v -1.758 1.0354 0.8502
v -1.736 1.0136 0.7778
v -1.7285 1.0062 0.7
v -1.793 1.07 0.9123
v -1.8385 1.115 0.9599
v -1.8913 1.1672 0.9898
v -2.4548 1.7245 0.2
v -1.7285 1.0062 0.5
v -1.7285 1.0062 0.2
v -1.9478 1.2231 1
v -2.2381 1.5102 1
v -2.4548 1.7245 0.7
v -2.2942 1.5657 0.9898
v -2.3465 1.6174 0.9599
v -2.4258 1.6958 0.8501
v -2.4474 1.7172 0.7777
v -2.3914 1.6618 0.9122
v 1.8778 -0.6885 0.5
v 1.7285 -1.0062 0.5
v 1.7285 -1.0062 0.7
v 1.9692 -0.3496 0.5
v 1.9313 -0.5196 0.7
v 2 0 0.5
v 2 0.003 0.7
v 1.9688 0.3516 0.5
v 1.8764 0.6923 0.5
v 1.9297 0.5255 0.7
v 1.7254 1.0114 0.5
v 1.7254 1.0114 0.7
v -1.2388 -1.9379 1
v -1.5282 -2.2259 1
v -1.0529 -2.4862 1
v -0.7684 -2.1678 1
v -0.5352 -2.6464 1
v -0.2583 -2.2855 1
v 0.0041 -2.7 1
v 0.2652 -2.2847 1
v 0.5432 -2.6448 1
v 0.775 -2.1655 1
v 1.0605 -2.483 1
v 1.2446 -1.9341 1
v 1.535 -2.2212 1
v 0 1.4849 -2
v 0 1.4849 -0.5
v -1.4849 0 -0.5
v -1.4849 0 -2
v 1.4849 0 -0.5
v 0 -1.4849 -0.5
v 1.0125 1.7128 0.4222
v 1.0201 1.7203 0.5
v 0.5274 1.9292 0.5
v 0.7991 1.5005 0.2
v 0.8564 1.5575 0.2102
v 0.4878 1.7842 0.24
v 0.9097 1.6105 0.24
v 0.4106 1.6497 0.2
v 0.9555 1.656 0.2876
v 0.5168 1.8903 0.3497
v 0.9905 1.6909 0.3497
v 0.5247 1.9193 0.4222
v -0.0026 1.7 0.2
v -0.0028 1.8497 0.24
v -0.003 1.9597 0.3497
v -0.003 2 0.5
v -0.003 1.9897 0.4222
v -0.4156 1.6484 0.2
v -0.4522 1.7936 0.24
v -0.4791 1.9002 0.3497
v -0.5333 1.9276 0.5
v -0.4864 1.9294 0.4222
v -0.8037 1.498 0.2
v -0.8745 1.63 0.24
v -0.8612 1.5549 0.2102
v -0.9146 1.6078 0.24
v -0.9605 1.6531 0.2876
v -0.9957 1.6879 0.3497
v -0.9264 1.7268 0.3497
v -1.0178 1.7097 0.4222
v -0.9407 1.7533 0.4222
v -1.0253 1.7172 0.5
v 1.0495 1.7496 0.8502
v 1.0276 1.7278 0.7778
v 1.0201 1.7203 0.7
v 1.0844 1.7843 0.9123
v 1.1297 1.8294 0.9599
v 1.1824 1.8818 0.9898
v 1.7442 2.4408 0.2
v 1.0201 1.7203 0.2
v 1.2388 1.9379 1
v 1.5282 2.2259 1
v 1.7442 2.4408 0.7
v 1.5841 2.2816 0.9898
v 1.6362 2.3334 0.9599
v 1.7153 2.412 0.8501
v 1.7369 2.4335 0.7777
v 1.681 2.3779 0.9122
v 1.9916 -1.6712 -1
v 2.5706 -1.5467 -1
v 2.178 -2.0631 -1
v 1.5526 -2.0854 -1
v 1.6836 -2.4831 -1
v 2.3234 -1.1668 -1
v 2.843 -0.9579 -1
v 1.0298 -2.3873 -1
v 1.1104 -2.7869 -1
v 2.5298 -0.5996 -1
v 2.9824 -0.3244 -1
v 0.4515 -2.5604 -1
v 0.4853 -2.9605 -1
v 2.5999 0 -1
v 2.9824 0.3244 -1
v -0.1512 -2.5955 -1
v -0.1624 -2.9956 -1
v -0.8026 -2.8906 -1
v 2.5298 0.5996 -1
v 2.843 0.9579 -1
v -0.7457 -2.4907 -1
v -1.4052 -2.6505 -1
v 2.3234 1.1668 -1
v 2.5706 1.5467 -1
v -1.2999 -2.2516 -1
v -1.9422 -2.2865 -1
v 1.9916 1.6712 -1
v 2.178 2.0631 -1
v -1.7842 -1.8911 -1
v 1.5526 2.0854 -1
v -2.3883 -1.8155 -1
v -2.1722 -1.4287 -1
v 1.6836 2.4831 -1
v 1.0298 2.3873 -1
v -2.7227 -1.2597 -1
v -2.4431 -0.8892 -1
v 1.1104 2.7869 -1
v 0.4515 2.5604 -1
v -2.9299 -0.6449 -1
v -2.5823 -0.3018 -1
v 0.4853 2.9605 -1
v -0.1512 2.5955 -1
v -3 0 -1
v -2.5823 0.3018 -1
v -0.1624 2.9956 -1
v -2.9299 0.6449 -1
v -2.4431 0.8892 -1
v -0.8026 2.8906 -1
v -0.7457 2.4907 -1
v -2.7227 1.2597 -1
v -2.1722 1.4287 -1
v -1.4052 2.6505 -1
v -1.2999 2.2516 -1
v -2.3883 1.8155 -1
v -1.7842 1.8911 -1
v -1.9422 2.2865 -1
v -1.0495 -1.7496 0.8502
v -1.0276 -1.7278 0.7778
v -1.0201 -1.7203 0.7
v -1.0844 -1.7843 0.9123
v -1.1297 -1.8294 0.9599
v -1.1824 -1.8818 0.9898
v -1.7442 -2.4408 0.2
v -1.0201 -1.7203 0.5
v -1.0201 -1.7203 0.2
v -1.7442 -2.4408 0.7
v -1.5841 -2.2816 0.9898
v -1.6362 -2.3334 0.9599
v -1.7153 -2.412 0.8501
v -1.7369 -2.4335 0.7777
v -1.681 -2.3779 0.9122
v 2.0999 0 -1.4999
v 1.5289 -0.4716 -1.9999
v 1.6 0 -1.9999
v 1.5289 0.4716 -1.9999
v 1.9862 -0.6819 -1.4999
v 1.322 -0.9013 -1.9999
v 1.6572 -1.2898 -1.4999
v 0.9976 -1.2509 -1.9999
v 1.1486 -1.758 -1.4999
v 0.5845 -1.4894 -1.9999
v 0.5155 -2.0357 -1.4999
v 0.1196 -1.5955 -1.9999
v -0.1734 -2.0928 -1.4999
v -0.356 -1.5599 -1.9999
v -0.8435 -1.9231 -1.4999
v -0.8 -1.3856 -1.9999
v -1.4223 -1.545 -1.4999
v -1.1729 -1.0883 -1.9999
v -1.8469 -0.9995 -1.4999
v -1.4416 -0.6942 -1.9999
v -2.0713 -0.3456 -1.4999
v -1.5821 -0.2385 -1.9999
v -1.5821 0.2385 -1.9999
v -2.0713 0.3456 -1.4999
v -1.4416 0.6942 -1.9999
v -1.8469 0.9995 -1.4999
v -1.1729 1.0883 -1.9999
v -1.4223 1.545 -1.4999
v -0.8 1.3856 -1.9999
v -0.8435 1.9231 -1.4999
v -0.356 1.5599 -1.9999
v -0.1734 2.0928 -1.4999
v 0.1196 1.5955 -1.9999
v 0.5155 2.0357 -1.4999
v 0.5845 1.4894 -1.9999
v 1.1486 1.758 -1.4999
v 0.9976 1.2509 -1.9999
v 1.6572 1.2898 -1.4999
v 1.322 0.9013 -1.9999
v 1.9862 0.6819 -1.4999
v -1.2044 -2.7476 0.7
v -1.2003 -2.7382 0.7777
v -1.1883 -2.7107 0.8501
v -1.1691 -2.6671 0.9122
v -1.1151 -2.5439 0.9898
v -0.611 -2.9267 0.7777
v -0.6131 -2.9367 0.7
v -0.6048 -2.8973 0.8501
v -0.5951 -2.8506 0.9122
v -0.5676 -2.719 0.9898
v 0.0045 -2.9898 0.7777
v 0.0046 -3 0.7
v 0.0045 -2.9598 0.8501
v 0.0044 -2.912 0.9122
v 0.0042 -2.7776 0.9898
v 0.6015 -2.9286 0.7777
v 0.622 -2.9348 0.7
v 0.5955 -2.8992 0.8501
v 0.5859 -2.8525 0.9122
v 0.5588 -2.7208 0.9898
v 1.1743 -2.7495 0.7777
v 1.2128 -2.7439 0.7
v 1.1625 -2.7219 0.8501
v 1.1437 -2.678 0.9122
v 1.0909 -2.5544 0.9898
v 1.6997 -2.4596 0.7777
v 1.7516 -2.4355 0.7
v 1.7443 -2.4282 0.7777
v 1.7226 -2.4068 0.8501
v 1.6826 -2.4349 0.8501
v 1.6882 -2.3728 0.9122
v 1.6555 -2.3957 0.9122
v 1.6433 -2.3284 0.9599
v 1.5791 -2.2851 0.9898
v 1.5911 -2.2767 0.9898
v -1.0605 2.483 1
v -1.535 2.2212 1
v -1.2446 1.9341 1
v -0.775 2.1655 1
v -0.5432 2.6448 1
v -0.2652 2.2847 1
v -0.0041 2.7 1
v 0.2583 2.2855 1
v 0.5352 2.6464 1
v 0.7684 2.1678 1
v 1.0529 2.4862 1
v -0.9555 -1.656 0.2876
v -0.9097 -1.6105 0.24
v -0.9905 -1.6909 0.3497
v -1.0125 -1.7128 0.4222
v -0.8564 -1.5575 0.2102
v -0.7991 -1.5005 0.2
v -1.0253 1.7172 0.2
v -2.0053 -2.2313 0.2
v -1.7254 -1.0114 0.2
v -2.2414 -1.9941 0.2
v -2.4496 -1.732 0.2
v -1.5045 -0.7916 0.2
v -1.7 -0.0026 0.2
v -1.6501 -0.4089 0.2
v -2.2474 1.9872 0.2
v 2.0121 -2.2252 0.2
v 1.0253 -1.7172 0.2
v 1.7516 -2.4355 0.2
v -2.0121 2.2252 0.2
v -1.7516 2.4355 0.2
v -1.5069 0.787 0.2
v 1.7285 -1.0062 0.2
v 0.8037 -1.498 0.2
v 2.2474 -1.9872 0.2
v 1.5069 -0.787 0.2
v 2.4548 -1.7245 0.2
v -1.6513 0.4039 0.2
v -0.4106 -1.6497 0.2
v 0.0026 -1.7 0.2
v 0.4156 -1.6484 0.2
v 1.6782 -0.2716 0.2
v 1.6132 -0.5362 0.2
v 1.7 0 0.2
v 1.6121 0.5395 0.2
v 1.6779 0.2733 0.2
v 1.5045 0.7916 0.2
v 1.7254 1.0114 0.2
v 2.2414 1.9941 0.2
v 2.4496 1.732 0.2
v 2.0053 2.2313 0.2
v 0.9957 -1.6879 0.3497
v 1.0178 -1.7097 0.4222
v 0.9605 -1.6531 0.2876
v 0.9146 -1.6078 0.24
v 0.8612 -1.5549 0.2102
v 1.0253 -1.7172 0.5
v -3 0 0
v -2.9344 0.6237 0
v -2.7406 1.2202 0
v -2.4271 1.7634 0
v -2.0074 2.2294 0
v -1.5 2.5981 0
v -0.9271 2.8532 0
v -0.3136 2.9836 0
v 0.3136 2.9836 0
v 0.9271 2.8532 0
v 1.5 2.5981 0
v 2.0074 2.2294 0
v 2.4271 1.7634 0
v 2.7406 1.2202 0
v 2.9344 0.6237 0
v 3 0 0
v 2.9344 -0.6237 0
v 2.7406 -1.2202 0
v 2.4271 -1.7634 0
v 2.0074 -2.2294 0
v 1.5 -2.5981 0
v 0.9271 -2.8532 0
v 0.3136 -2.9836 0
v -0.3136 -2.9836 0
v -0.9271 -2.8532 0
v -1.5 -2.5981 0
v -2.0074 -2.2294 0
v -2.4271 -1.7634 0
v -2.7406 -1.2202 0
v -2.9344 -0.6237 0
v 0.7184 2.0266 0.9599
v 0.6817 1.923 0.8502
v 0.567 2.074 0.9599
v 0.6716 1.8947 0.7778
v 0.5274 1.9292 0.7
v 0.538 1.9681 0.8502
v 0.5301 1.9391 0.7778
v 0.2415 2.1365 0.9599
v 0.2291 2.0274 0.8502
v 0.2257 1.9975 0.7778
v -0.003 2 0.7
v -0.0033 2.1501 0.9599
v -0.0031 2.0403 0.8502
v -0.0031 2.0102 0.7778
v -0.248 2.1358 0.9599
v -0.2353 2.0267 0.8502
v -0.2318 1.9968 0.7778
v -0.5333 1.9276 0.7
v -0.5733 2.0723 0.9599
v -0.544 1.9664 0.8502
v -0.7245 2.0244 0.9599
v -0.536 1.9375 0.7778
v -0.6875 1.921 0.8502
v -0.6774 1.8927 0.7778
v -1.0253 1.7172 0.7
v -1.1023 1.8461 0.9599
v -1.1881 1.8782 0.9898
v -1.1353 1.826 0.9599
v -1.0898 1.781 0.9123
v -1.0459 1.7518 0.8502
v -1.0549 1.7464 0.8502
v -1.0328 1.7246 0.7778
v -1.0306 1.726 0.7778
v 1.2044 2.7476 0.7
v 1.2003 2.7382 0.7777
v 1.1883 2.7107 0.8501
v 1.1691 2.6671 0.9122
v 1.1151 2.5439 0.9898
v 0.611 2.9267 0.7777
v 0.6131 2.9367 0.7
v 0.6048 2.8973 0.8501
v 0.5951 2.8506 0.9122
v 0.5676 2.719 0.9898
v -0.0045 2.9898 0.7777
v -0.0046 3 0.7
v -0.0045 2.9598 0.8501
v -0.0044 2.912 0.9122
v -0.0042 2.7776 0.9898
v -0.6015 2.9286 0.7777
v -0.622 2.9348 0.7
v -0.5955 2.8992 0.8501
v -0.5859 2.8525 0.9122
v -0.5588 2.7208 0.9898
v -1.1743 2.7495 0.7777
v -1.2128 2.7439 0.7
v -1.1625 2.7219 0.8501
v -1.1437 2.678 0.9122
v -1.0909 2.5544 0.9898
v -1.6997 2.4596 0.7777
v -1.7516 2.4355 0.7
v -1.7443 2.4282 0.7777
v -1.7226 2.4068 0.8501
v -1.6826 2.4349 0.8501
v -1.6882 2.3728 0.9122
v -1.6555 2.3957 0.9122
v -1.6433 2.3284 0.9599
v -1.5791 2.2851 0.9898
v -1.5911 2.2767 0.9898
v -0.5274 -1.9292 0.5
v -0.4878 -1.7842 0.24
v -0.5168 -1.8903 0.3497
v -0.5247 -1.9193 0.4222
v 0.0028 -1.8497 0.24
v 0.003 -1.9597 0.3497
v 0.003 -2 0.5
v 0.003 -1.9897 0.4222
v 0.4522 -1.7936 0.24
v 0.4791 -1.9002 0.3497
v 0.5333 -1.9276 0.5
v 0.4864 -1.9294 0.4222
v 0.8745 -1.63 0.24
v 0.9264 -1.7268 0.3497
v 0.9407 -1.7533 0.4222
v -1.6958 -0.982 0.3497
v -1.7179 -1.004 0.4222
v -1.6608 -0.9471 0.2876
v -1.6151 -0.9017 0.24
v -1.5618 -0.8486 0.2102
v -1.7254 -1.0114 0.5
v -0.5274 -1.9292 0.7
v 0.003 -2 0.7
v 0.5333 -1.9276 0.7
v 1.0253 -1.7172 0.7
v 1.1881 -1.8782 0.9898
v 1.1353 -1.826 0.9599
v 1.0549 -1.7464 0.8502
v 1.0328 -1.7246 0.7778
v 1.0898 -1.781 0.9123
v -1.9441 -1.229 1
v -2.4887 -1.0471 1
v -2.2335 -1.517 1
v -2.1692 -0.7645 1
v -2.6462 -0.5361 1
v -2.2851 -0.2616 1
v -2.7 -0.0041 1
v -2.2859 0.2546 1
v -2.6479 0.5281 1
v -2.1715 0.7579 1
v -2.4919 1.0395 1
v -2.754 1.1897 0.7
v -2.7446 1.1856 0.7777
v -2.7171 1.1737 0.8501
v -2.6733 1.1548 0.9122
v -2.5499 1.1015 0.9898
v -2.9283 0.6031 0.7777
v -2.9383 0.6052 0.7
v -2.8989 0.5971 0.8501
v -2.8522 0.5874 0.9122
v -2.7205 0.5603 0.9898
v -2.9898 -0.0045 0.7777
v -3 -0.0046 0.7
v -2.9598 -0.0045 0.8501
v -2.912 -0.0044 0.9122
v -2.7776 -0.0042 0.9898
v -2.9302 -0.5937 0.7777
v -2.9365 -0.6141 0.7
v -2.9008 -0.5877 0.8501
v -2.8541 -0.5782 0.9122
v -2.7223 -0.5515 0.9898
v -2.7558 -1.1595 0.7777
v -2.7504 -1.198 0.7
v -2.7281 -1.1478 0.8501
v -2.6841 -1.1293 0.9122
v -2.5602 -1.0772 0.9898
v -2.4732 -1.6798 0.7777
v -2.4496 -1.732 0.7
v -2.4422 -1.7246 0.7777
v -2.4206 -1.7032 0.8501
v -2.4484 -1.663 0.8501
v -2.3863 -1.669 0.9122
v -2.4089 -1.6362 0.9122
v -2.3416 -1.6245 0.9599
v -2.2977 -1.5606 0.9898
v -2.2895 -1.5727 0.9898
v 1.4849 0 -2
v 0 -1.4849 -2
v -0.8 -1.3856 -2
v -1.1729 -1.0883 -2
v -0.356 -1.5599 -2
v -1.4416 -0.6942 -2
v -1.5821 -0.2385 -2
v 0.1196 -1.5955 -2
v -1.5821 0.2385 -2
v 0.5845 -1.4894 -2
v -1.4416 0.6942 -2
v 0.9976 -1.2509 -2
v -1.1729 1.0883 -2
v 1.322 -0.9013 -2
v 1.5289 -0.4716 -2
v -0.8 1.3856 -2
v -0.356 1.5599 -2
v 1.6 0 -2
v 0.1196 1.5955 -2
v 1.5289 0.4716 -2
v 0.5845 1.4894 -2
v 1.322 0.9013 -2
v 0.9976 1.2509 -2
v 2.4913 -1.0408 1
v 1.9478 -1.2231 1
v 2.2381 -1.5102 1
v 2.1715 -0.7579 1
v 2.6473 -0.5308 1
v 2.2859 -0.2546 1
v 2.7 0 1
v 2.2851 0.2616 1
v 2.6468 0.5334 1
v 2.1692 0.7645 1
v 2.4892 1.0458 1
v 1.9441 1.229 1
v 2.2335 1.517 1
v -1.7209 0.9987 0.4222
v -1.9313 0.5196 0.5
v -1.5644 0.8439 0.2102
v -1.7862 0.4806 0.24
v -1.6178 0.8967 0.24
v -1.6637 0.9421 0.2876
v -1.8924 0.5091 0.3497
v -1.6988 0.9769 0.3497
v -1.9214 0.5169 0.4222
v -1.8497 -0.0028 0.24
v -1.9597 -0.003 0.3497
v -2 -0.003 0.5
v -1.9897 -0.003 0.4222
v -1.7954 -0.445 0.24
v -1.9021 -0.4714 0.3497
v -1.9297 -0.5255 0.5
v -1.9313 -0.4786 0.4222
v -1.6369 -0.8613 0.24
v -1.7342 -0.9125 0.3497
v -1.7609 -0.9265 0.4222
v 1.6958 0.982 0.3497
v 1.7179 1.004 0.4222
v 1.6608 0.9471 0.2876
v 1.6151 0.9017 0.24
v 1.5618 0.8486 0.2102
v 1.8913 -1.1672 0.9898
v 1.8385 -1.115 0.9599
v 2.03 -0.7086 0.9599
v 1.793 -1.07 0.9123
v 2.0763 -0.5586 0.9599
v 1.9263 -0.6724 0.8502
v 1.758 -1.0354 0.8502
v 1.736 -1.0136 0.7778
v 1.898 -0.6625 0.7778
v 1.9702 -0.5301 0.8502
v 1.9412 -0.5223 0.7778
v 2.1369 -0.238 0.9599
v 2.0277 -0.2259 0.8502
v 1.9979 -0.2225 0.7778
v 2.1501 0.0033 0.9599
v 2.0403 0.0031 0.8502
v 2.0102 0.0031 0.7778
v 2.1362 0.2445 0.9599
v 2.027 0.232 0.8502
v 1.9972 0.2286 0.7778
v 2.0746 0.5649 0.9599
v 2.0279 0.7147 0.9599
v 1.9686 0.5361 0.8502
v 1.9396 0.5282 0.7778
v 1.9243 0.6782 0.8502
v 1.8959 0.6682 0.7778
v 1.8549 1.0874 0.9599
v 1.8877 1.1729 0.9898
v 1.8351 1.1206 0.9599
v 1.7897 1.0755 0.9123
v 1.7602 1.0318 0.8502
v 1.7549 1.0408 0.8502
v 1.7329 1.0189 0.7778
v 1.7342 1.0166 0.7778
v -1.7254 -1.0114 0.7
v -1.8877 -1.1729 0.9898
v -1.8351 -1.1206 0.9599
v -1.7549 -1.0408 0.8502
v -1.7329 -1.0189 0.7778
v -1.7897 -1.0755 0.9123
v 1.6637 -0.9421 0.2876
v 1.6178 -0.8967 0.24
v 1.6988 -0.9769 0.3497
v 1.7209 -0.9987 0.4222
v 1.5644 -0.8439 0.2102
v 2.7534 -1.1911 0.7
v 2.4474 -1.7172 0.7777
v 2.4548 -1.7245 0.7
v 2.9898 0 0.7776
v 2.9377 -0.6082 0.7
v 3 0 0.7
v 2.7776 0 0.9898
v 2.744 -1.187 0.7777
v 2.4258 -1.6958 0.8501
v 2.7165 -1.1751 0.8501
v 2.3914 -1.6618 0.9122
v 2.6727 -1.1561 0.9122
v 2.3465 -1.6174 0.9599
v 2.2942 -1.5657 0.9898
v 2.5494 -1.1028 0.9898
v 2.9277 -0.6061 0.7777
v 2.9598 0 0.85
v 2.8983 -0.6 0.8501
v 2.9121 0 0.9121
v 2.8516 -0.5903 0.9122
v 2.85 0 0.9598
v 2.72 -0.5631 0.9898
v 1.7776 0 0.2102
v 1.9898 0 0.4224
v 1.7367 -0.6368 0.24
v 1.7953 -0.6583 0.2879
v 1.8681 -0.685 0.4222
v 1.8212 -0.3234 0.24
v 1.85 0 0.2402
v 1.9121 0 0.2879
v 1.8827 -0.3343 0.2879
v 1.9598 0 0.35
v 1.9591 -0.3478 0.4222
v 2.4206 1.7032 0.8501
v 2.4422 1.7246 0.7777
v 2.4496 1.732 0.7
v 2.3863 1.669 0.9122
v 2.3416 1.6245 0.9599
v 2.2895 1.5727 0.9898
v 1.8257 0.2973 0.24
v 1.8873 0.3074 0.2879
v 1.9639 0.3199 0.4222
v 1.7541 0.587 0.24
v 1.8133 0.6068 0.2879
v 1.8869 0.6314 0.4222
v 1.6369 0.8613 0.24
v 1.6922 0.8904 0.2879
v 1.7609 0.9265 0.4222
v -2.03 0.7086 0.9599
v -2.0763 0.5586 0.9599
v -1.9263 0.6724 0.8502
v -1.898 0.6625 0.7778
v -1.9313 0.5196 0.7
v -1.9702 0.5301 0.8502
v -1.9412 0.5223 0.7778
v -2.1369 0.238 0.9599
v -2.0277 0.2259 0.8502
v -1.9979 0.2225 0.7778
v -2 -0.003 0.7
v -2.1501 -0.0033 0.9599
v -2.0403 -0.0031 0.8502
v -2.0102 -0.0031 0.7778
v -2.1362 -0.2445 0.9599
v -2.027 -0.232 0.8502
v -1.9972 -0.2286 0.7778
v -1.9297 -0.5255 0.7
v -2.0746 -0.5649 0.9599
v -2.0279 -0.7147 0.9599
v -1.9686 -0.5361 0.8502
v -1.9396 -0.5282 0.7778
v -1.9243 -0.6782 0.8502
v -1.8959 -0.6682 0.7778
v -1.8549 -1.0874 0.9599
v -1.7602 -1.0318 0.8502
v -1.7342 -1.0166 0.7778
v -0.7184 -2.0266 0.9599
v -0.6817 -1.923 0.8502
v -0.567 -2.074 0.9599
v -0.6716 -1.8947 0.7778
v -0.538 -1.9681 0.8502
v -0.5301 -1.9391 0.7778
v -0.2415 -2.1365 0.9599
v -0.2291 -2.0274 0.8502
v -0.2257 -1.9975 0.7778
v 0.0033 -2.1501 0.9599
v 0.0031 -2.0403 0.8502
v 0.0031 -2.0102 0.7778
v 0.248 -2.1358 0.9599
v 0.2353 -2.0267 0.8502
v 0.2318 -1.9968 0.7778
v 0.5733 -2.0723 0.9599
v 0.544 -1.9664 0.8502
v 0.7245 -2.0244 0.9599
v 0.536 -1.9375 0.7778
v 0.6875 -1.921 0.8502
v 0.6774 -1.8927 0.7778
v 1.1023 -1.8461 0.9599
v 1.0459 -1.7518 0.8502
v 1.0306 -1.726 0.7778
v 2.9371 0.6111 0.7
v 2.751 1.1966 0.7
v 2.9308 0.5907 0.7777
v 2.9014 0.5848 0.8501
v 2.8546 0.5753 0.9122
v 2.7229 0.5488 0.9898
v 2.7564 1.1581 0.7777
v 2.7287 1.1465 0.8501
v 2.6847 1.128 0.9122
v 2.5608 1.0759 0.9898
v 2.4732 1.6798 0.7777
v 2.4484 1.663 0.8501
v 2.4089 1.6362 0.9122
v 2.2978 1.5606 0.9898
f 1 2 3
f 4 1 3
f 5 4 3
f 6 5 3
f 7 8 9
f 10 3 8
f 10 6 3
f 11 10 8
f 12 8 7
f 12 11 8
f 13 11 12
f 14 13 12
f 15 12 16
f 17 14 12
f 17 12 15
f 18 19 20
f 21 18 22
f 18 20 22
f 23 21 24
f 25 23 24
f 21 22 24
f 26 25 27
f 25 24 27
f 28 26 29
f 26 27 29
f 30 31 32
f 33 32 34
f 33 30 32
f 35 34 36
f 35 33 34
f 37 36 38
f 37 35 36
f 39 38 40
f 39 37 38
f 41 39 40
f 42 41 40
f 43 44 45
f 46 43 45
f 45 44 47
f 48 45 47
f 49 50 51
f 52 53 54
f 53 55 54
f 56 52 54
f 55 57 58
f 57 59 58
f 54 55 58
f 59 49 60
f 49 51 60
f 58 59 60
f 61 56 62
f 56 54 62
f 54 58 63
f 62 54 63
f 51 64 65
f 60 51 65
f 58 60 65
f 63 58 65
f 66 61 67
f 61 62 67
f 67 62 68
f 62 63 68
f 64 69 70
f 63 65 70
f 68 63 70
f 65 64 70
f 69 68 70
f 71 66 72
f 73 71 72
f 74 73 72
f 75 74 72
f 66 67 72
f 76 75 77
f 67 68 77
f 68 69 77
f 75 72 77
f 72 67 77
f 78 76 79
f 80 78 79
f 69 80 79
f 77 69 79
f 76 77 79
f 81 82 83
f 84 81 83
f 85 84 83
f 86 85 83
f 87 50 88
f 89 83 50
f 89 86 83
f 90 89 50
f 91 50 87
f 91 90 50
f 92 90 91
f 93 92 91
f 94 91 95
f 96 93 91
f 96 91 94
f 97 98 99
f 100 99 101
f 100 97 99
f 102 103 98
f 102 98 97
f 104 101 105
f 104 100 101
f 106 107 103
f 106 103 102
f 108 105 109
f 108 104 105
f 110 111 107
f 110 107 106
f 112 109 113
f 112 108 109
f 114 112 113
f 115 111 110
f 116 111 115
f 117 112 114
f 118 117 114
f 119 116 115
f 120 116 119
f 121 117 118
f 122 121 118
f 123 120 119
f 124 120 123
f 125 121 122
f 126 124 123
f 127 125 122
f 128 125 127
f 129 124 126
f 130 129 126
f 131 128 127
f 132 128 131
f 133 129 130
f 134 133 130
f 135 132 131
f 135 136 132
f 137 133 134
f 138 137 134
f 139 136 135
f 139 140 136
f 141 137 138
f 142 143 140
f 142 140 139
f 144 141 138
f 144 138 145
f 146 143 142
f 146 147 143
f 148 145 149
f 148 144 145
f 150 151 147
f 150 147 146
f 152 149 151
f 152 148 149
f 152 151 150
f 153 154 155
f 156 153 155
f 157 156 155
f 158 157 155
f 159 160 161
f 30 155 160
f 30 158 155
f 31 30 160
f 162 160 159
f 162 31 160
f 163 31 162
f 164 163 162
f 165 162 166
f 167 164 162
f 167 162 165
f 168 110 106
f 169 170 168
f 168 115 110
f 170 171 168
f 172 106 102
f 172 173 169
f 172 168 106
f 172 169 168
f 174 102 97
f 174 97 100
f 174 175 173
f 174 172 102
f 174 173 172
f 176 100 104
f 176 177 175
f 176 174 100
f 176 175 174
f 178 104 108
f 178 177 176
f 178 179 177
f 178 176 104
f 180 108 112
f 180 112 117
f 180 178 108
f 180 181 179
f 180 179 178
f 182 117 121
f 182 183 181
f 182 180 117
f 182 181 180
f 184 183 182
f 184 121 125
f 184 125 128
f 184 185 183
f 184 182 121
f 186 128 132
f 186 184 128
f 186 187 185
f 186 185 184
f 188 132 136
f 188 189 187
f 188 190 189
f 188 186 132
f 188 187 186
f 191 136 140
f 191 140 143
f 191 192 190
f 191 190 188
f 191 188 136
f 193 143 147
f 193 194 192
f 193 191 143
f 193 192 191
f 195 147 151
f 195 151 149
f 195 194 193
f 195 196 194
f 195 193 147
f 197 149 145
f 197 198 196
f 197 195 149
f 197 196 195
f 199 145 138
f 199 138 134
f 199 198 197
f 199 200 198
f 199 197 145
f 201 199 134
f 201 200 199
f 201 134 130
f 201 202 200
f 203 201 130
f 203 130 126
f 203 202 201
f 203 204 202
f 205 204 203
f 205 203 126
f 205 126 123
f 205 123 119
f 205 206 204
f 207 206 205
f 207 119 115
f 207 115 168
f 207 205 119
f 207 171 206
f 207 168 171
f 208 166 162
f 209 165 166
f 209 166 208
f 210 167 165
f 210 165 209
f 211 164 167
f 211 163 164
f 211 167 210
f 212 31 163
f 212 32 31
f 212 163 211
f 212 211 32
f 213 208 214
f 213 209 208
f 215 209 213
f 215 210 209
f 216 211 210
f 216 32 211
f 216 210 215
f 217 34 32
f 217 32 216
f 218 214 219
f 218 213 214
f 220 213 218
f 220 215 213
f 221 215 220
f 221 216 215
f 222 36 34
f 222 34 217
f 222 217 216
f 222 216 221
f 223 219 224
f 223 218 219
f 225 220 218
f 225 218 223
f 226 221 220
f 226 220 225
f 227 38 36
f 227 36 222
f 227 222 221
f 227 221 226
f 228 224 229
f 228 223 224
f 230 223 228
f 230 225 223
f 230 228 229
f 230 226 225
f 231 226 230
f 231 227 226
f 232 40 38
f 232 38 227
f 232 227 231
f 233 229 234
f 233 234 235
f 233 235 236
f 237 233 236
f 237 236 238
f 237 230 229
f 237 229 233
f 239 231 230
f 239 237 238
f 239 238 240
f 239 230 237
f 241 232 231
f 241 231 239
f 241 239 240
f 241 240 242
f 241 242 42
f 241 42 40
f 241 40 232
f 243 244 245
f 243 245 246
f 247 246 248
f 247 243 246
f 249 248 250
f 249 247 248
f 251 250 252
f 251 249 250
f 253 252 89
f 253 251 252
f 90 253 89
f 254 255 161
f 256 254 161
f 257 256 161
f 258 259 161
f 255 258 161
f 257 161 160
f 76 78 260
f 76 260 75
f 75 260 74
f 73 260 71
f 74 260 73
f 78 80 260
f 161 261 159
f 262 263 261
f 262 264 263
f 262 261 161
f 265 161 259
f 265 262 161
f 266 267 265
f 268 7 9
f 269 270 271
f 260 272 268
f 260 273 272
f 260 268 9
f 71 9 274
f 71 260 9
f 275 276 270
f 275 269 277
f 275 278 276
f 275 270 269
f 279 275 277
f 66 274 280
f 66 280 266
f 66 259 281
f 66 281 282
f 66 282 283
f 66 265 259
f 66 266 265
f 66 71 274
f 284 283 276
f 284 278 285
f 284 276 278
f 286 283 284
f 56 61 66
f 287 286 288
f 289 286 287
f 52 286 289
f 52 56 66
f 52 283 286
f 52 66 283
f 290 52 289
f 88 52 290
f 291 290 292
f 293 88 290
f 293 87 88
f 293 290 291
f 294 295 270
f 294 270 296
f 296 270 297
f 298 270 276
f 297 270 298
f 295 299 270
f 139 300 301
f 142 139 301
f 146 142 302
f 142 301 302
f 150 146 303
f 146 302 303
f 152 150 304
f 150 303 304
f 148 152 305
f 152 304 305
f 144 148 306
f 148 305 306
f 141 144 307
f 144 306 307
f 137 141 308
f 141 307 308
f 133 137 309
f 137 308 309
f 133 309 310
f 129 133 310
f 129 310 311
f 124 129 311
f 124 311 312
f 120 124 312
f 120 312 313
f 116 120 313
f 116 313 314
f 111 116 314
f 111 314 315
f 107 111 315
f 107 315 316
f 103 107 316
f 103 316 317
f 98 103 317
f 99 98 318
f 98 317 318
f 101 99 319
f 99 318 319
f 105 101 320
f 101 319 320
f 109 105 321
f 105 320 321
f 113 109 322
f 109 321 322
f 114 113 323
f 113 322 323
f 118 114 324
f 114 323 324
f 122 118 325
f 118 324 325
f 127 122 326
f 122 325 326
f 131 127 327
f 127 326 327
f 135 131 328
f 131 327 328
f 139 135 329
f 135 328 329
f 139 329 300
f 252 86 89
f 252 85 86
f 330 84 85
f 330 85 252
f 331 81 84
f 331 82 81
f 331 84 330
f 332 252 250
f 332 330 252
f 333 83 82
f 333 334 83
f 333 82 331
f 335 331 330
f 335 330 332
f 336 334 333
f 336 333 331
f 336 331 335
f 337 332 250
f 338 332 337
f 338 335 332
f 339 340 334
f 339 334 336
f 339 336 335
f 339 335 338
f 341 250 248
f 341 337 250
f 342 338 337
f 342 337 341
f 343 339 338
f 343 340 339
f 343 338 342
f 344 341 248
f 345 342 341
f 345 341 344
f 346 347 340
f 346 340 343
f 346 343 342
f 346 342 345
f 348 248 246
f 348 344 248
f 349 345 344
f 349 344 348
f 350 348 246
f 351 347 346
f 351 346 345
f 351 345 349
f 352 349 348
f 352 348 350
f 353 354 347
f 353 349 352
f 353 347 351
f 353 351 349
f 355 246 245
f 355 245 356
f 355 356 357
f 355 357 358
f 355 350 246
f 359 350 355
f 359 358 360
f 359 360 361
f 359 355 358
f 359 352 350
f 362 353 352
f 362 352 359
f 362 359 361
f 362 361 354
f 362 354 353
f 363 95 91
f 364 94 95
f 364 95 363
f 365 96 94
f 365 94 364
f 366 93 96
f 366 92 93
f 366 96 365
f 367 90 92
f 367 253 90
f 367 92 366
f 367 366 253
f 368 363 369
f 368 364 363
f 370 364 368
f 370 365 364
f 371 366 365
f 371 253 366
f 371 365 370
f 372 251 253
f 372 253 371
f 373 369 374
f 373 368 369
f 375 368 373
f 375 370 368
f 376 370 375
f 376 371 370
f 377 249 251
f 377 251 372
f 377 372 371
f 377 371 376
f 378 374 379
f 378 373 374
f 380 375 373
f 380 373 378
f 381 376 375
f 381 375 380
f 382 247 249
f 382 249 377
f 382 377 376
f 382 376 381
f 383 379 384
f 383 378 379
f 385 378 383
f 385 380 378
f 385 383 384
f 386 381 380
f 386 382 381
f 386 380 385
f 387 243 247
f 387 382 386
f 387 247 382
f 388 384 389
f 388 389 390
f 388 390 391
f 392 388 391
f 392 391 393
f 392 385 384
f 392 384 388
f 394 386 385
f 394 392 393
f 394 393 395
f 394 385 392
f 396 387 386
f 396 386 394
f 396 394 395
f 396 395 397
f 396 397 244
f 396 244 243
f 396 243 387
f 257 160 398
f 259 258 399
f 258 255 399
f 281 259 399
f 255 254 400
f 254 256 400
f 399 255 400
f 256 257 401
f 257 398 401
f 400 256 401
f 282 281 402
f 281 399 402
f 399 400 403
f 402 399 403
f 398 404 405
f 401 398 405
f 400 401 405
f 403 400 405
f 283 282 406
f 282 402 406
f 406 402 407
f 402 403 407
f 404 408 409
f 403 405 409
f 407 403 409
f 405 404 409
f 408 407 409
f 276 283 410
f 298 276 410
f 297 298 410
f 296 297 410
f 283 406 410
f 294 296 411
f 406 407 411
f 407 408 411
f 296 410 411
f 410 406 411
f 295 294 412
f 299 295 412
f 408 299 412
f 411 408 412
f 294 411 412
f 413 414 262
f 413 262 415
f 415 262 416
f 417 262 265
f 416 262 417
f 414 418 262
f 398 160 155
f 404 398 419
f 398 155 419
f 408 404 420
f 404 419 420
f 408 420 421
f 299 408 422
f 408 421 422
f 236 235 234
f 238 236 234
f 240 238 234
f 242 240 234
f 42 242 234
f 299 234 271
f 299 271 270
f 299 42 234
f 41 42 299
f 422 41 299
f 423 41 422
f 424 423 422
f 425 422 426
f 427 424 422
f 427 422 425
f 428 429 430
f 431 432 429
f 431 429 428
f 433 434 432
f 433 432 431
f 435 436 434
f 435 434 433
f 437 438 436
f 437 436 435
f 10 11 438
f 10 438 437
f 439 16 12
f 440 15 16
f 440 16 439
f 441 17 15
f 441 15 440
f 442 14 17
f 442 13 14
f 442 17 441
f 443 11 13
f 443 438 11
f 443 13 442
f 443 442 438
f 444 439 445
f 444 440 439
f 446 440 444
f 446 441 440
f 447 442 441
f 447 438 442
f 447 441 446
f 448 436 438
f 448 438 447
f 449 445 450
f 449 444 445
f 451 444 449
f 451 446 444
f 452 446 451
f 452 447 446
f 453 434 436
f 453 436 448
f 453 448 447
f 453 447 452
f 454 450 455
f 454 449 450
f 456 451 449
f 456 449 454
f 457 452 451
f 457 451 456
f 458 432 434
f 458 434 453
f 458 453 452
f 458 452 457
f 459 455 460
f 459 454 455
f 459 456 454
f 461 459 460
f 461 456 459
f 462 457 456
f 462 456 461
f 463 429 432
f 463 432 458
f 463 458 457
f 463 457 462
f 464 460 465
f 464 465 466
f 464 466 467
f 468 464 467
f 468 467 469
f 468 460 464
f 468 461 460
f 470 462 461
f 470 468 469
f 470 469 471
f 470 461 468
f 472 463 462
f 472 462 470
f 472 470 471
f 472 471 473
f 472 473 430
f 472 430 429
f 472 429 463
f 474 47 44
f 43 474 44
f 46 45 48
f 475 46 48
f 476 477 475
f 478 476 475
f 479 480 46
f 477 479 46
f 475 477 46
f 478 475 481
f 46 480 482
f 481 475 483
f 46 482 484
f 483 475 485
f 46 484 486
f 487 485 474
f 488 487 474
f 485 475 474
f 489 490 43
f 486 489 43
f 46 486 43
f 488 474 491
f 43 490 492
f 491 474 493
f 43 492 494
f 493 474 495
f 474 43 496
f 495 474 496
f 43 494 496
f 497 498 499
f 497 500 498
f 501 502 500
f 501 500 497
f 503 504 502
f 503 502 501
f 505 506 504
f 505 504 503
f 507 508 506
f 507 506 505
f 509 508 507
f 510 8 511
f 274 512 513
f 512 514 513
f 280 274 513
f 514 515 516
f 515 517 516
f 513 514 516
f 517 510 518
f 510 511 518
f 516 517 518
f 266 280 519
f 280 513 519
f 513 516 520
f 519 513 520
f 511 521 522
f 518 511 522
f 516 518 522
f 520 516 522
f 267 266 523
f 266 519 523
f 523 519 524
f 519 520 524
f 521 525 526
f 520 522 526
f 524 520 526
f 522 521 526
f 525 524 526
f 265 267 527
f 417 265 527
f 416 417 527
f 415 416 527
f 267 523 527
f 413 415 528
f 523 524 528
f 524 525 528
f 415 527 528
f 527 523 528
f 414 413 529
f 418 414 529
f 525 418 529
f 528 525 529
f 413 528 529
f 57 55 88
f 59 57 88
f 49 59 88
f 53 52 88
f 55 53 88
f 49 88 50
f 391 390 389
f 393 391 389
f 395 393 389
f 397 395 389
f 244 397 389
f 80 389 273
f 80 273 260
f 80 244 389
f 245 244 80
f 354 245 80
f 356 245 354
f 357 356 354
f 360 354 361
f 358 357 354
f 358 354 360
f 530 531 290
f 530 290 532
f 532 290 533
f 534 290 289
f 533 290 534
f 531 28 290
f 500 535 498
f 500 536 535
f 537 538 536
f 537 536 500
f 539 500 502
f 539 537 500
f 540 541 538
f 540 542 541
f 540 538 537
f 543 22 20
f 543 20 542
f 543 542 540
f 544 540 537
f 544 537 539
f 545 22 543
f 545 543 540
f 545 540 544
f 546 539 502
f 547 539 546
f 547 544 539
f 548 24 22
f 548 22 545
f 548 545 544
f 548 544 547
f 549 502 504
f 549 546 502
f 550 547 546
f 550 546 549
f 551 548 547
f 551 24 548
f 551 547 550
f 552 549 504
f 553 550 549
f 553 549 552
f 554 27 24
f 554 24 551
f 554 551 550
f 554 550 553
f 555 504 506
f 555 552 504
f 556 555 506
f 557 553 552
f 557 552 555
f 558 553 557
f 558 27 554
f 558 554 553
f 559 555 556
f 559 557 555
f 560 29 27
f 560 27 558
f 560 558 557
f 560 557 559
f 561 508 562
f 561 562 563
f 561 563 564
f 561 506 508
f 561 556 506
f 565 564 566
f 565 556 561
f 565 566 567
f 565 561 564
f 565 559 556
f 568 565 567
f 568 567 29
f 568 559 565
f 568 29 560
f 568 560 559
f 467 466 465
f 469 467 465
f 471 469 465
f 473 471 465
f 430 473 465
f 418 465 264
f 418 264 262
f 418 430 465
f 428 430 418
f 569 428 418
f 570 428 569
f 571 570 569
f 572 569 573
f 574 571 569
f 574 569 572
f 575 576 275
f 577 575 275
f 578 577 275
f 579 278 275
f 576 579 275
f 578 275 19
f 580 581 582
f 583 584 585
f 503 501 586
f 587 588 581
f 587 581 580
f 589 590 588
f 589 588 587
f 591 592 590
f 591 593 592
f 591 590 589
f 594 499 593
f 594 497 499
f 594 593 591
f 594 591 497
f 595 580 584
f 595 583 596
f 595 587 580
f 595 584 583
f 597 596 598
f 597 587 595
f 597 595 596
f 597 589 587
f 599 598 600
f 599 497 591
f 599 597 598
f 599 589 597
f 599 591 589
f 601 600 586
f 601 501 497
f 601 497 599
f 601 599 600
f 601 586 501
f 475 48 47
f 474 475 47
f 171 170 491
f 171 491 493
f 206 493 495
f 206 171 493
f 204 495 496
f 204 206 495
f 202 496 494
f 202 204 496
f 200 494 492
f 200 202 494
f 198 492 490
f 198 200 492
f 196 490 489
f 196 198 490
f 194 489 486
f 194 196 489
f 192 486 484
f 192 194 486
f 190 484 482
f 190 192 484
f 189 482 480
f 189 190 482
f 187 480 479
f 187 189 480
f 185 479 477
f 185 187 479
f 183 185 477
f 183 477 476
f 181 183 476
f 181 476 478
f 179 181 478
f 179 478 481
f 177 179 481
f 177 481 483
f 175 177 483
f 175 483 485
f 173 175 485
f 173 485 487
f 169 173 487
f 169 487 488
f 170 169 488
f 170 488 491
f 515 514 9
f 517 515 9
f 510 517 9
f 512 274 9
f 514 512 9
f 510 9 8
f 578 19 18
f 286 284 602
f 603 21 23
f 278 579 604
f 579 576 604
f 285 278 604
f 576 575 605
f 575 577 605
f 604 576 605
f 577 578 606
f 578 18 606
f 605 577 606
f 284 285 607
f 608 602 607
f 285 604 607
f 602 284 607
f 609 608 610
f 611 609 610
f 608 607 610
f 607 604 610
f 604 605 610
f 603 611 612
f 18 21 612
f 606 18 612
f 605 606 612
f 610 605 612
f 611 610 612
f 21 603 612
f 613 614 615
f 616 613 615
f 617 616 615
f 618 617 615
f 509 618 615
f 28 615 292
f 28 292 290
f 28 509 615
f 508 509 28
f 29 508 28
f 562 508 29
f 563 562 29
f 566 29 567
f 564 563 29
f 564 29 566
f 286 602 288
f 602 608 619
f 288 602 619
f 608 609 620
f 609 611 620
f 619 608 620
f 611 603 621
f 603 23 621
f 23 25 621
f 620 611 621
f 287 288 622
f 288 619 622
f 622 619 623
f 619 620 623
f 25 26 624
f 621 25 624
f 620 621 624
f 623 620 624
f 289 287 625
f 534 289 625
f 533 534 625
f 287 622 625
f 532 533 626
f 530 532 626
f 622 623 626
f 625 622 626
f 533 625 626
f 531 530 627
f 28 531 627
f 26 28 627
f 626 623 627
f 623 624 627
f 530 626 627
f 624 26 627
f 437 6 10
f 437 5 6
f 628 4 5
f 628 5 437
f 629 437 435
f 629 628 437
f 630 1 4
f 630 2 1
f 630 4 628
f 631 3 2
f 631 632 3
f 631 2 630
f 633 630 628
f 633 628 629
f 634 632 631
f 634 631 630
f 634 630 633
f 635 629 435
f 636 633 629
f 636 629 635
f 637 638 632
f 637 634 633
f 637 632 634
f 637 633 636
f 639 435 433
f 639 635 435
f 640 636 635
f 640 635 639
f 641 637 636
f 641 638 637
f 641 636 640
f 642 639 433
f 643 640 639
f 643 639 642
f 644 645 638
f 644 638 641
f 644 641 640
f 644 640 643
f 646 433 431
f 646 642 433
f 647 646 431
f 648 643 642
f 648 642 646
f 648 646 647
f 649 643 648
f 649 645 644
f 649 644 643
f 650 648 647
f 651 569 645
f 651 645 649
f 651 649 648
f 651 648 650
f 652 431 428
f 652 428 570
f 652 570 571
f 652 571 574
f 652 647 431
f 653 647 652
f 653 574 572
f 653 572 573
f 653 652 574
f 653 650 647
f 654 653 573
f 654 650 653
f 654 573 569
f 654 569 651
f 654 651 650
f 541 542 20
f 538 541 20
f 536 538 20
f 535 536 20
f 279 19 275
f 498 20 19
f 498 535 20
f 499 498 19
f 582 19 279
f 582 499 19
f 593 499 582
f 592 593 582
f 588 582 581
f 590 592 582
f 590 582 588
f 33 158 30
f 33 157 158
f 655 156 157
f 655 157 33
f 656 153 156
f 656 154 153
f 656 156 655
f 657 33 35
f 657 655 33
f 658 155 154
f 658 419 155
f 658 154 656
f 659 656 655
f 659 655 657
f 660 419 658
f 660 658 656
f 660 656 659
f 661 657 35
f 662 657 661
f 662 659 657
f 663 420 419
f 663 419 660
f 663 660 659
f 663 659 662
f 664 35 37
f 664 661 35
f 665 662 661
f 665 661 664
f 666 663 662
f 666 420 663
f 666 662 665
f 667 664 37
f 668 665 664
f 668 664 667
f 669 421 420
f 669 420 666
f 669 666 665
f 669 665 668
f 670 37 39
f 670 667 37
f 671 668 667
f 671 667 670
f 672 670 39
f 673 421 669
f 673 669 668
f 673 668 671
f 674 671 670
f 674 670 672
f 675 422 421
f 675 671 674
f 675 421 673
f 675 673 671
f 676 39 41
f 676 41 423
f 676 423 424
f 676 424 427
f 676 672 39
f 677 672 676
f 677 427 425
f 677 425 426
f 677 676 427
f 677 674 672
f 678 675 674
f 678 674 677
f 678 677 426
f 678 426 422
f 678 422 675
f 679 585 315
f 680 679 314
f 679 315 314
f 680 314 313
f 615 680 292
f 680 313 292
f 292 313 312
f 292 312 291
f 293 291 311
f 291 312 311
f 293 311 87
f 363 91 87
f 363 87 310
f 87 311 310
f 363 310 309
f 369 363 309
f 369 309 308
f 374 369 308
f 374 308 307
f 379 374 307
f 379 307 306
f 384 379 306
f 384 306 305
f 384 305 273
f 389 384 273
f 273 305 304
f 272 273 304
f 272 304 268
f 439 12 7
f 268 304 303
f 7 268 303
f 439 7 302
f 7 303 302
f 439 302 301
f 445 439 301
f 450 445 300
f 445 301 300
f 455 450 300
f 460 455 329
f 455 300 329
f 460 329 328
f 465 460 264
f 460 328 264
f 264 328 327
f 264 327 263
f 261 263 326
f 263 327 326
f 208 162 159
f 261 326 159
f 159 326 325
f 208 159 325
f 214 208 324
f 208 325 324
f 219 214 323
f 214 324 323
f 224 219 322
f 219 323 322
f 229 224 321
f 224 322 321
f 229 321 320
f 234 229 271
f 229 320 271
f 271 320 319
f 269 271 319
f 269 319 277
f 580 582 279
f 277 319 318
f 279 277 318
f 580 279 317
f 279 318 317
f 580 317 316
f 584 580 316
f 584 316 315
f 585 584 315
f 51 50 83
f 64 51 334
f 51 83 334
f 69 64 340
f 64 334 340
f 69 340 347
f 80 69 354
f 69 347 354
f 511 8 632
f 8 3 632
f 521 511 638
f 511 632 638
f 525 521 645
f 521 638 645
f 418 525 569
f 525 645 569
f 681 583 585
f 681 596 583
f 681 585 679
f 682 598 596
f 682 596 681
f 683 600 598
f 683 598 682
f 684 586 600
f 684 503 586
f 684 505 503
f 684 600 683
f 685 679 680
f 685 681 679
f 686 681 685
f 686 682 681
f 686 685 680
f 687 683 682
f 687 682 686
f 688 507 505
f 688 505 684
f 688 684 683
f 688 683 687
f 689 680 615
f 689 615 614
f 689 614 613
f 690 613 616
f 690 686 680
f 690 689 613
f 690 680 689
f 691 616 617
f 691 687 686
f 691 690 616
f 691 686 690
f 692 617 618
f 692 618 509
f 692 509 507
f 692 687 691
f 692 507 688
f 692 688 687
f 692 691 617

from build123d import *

# Parameters (mm, degrees)
SKETCH_1_R          = 1.599999994
EXTRUDE_1_DEPTH     = 2
SKETCH_2_R          = 3
EXTRUDE_2_DEPTH     = 1
SKETCH_3_R          = 3
SKETCH_3_R_2        = 1.599999994
EXTRUDE_3_DEPTH     = 1
CUT_EXTRUDE_1_DEPTH = 0.8
SKETCH_5_R          = 2
CUT_EXTRUDE_2_DEPTH = 0.8
FILLET_1_R          = 0.3
FILLET_2_R          = 0.3
CHAMFER_2_SIZE      = 1
EXTRUDE_4_DEPTH     = 0.5


# Some blends are built 0.0001 mm under size
with BuildPart() as part:
    # 草图1 → 凸台-拉伸1 (new body)
    with BuildSketch(Plane.XY):
        Circle(SKETCH_1_R)
        Polygon((1.484924235, 0), (0, 1.484924235), (-1.484924235, 0), (0, -1.484924235), align=None, mode=Mode.SUBTRACT)
    extrude(amount=-EXTRUDE_1_DEPTH)

    # 草图2 → 凸台-拉伸2 (add)
    with BuildSketch(Plane.XY):
        Circle(SKETCH_2_R)
    extrude(amount=EXTRUDE_2_DEPTH)

    # 草图3 → 凸台-拉伸3 (add)
    with BuildSketch(Plane(origin=(0, 0, 0), x_dir=(-1, 0, 0), z_dir=(0, 0, -1))):
        Circle(SKETCH_3_R)
        with Locations(Location((0, 0, 0), (0, 0, 180))):
            Circle(SKETCH_3_R_2, mode=Mode.SUBTRACT)
    extrude(amount=EXTRUDE_3_DEPTH)

    # 草图4 → 切除-拉伸1 (cut)
    with BuildSketch(Plane.XY.offset(1)):
        Polygon((2.840154811, -2.105592708), (2.13698266, -2.816612347), (0.001071679, -0.704275308), (-2.12840084, -2.823102879), (-2.833733613, -2.114226528), (-0.709971025, -0.001080346), (-2.840154811, 2.105592708), (-2.13698266, 2.816612347), (-0.001071679, 0.704275308), (2.12840084, 2.823102879), (2.833733613, 2.114226528), (0.709971025, 0.001080346), align=None)
    extrude(amount=-CUT_EXTRUDE_1_DEPTH, mode=Mode.SUBTRACT)

    # 草图5 → 切除-拉伸2 (cut)
    with BuildSketch(Plane.XY.offset(1)):
        Circle(SKETCH_5_R)
    extrude(amount=-CUT_EXTRUDE_2_DEPTH, mode=Mode.SUBTRACT)

    # 圆角1
    fillet_1_edges = [part.edges().sort_by_distance(p)[0] for p in [
        (1.930129409, 0.524023343, 1),
        (0.003043349, -1.999997685, 1),
        (-1.999997685, -0.003043349, 1),
        (-0.003043349, 1.999997685, 1),
        (-0.004565023, 2.999996527, 1),
        (-2.999996527, -0.004565023, 1),
        (0.004565023, -2.999996527, 1),
        (2.859077887, 0.908665855, 1),
    ]]
    fillet(fillet_1_edges, radius=FILLET_1_R)

    # 圆角2
    # the kernel refuses this fillet: 0.3 mm, written as the material it adds along each edge
    with BuildSketch(Plane(origin=(0, 0, 0.2), x_dir=(0.7896841124236736, 0.613513653137104, 0), z_dir=(0.613513653137104, -0.7896841124236736, 0))) as fillet_2_piece_1_section:
        with BuildLine():
            CenterArc((2 - FILLET_2_R, FILLET_2_R), FILLET_2_R, 270, 90)
            Line((2 - FILLET_2_R, 0), (2, 0))
            Line((2, 0), (2, FILLET_2_R))
        make_face()
    fillet_2_piece_1 = revolve(axis=Axis((0, 0, 0.2), (0, 0, 1)), revolution_arc=104.486373309, mode=Mode.PRIVATE)
    fillet_2_piece_1 = split(fillet_2_piece_1, bisect_by=Plane(origin=(0.603196481, 1.305522812, 0.285319886), z_dir=(-0.7053327724211024, 0.7088763503945956, 0)), keep=Keep.TOP, mode=Mode.PRIVATE)
    fillet_2_piece_1 = split(fillet_2_piece_1, bisect_by=Plane(origin=(-0.607166844, 1.303681031, 0.285319886), z_dir=(0.7031721506430704, 0.711019638659861, 0)), keep=Keep.TOP, mode=Mode.PRIVATE)
    add(fillet_2_piece_1)
    with BuildSketch(Plane(origin=(0, 0, 0.2), x_dir=(1, 0, 0), z_dir=(0, -1, 0))) as fillet_2_piece_2_section:
        with BuildLine():
            CenterArc((2 - FILLET_2_R, FILLET_2_R), FILLET_2_R, 270, 90)
            Line((2 - FILLET_2_R, 0), (2, 0))
            Line((2, 0), (2, FILLET_2_R))
        make_face()
    fillet_2_piece_2 = revolve(axis=Axis((0, 0, 0.2), (0, 0, 1)), revolution_arc=51.865822775, mode=Mode.PRIVATE)
    fillet_2_piece_2 = split(fillet_2_piece_2, bisect_by=Plane(origin=(1.528365858, 0.815384132, 0.269855635), z_dir=(0.7053327724211024, -0.7088763503945955, 0)), keep=Keep.TOP, mode=Mode.PRIVATE)
    add(fillet_2_piece_2)
    with BuildSketch(Plane(origin=(0, 0, 0.2), x_dir=(-0.7896841124236732, -0.6135136531371046, 0), z_dir=(-0.6135136531371046, 0.7896841124236732, 0))) as fillet_2_piece_3_section:
        with BuildLine():
            CenterArc((2 - FILLET_2_R, FILLET_2_R), FILLET_2_R, 270, 90)
            Line((2 - FILLET_2_R, 0), (2, 0))
            Line((2, 0), (2, FILLET_2_R))
        make_face()
    fillet_2_piece_3 = revolve(axis=Axis((0, 0, 0.2), (0, 0, 1)), revolution_arc=104.486373309, mode=Mode.PRIVATE)
    fillet_2_piece_3 = split(fillet_2_piece_3, bisect_by=Plane(origin=(0.607166844, -1.303681031, 0.285319886), z_dir=(-0.7031721506430706, -0.7110196386598608, 0)), keep=Keep.TOP, mode=Mode.PRIVATE)
    fillet_2_piece_3 = split(fillet_2_piece_3, bisect_by=Plane(origin=(-0.603196481, -1.305522812, 0.285319886), z_dir=(0.7053327724211026, -0.7088763503945954, 0)), keep=Keep.TOP, mode=Mode.PRIVATE)
    add(fillet_2_piece_3)
    with BuildSketch(Plane(origin=(0, 0, 0.2), x_dir=(-0.6198560202042671, 0.784715562619047, 0), z_dir=(0.784715562619047, 0.6198560202042671, 0))) as fillet_2_piece_4_section:
        with BuildLine():
            CenterArc((2 - FILLET_2_R, FILLET_2_R), FILLET_2_R, 270, 90)
            Line((2 - FILLET_2_R, 0), (2, 0))
            Line((2, 0), (2, FILLET_2_R))
        make_face()
    fillet_2_piece_4 = revolve(axis=Axis((0, 0, 0.2), (0, 0, 1)), revolution_arc=103.563128964, mode=Mode.PRIVATE)
    fillet_2_piece_4 = split(fillet_2_piece_4, bisect_by=Plane(origin=(-1.316253088, -0.604331686, 0.285332918), z_dir=(-0.7053327724211024, 0.7088763503945957, 0)), keep=Keep.TOP, mode=Mode.PRIVATE)
    fillet_2_piece_4 = split(fillet_2_piece_4, bisect_by=Plane(origin=(-1.318086183, 0.600323075, 0.285332918), z_dir=(-0.7031721506430707, -0.7110196386598606, 0)), keep=Keep.TOP, mode=Mode.PRIVATE)
    add(fillet_2_piece_4)
    with BuildSketch(Plane(origin=(0, 0, 0.2), x_dir=(0.6198962648649622, -0.7846837712139004, 0), z_dir=(-0.7846837712139004, -0.6198962648649622, 0))) as fillet_2_piece_5_section:
        with BuildLine():
            CenterArc((2 - FILLET_2_R, FILLET_2_R), FILLET_2_R, 270, 90)
            Line((2 - FILLET_2_R, 0), (2, 0))
            Line((2, 0), (2, FILLET_2_R))
        make_face()
    fillet_2_piece_5 = revolve(axis=Axis((0, 0, 0.2), (0, 0, 1)), revolution_arc=51.69144042, mode=Mode.PRIVATE)
    fillet_2_piece_5 = split(fillet_2_piece_5, bisect_by=Plane(origin=(1.532032043, -0.811907626, 0.269859578), z_dir=(0.7031721506430706, 0.7110196386598608, 0)), keep=Keep.TOP, mode=Mode.PRIVATE)
    add(fillet_2_piece_5)

    # 倒角2
    chamfer_2_edges = [part.edges().sort_by_distance(p)[0] for p in [
        (-1.599999994, 0, -1),
    ]]
    chamfer(chamfer_2_edges, length=CHAMFER_2_SIZE - 0.0001)  # a hair under: the kernel refuses the full size

    # 草图6 → 凸台-拉伸4 (add)
    with BuildSketch(Plane(origin=(0, 0, 0), x_dir=(-1, 0, 0), z_dir=(0, 0, -1))):
        Polygon((0, 1.484924235), (1.484924235, 0), (0, -1.484924235), (-1.484924235, 0), align=None)
    extrude(amount=EXTRUDE_4_DEPTH)


solid = part.part
